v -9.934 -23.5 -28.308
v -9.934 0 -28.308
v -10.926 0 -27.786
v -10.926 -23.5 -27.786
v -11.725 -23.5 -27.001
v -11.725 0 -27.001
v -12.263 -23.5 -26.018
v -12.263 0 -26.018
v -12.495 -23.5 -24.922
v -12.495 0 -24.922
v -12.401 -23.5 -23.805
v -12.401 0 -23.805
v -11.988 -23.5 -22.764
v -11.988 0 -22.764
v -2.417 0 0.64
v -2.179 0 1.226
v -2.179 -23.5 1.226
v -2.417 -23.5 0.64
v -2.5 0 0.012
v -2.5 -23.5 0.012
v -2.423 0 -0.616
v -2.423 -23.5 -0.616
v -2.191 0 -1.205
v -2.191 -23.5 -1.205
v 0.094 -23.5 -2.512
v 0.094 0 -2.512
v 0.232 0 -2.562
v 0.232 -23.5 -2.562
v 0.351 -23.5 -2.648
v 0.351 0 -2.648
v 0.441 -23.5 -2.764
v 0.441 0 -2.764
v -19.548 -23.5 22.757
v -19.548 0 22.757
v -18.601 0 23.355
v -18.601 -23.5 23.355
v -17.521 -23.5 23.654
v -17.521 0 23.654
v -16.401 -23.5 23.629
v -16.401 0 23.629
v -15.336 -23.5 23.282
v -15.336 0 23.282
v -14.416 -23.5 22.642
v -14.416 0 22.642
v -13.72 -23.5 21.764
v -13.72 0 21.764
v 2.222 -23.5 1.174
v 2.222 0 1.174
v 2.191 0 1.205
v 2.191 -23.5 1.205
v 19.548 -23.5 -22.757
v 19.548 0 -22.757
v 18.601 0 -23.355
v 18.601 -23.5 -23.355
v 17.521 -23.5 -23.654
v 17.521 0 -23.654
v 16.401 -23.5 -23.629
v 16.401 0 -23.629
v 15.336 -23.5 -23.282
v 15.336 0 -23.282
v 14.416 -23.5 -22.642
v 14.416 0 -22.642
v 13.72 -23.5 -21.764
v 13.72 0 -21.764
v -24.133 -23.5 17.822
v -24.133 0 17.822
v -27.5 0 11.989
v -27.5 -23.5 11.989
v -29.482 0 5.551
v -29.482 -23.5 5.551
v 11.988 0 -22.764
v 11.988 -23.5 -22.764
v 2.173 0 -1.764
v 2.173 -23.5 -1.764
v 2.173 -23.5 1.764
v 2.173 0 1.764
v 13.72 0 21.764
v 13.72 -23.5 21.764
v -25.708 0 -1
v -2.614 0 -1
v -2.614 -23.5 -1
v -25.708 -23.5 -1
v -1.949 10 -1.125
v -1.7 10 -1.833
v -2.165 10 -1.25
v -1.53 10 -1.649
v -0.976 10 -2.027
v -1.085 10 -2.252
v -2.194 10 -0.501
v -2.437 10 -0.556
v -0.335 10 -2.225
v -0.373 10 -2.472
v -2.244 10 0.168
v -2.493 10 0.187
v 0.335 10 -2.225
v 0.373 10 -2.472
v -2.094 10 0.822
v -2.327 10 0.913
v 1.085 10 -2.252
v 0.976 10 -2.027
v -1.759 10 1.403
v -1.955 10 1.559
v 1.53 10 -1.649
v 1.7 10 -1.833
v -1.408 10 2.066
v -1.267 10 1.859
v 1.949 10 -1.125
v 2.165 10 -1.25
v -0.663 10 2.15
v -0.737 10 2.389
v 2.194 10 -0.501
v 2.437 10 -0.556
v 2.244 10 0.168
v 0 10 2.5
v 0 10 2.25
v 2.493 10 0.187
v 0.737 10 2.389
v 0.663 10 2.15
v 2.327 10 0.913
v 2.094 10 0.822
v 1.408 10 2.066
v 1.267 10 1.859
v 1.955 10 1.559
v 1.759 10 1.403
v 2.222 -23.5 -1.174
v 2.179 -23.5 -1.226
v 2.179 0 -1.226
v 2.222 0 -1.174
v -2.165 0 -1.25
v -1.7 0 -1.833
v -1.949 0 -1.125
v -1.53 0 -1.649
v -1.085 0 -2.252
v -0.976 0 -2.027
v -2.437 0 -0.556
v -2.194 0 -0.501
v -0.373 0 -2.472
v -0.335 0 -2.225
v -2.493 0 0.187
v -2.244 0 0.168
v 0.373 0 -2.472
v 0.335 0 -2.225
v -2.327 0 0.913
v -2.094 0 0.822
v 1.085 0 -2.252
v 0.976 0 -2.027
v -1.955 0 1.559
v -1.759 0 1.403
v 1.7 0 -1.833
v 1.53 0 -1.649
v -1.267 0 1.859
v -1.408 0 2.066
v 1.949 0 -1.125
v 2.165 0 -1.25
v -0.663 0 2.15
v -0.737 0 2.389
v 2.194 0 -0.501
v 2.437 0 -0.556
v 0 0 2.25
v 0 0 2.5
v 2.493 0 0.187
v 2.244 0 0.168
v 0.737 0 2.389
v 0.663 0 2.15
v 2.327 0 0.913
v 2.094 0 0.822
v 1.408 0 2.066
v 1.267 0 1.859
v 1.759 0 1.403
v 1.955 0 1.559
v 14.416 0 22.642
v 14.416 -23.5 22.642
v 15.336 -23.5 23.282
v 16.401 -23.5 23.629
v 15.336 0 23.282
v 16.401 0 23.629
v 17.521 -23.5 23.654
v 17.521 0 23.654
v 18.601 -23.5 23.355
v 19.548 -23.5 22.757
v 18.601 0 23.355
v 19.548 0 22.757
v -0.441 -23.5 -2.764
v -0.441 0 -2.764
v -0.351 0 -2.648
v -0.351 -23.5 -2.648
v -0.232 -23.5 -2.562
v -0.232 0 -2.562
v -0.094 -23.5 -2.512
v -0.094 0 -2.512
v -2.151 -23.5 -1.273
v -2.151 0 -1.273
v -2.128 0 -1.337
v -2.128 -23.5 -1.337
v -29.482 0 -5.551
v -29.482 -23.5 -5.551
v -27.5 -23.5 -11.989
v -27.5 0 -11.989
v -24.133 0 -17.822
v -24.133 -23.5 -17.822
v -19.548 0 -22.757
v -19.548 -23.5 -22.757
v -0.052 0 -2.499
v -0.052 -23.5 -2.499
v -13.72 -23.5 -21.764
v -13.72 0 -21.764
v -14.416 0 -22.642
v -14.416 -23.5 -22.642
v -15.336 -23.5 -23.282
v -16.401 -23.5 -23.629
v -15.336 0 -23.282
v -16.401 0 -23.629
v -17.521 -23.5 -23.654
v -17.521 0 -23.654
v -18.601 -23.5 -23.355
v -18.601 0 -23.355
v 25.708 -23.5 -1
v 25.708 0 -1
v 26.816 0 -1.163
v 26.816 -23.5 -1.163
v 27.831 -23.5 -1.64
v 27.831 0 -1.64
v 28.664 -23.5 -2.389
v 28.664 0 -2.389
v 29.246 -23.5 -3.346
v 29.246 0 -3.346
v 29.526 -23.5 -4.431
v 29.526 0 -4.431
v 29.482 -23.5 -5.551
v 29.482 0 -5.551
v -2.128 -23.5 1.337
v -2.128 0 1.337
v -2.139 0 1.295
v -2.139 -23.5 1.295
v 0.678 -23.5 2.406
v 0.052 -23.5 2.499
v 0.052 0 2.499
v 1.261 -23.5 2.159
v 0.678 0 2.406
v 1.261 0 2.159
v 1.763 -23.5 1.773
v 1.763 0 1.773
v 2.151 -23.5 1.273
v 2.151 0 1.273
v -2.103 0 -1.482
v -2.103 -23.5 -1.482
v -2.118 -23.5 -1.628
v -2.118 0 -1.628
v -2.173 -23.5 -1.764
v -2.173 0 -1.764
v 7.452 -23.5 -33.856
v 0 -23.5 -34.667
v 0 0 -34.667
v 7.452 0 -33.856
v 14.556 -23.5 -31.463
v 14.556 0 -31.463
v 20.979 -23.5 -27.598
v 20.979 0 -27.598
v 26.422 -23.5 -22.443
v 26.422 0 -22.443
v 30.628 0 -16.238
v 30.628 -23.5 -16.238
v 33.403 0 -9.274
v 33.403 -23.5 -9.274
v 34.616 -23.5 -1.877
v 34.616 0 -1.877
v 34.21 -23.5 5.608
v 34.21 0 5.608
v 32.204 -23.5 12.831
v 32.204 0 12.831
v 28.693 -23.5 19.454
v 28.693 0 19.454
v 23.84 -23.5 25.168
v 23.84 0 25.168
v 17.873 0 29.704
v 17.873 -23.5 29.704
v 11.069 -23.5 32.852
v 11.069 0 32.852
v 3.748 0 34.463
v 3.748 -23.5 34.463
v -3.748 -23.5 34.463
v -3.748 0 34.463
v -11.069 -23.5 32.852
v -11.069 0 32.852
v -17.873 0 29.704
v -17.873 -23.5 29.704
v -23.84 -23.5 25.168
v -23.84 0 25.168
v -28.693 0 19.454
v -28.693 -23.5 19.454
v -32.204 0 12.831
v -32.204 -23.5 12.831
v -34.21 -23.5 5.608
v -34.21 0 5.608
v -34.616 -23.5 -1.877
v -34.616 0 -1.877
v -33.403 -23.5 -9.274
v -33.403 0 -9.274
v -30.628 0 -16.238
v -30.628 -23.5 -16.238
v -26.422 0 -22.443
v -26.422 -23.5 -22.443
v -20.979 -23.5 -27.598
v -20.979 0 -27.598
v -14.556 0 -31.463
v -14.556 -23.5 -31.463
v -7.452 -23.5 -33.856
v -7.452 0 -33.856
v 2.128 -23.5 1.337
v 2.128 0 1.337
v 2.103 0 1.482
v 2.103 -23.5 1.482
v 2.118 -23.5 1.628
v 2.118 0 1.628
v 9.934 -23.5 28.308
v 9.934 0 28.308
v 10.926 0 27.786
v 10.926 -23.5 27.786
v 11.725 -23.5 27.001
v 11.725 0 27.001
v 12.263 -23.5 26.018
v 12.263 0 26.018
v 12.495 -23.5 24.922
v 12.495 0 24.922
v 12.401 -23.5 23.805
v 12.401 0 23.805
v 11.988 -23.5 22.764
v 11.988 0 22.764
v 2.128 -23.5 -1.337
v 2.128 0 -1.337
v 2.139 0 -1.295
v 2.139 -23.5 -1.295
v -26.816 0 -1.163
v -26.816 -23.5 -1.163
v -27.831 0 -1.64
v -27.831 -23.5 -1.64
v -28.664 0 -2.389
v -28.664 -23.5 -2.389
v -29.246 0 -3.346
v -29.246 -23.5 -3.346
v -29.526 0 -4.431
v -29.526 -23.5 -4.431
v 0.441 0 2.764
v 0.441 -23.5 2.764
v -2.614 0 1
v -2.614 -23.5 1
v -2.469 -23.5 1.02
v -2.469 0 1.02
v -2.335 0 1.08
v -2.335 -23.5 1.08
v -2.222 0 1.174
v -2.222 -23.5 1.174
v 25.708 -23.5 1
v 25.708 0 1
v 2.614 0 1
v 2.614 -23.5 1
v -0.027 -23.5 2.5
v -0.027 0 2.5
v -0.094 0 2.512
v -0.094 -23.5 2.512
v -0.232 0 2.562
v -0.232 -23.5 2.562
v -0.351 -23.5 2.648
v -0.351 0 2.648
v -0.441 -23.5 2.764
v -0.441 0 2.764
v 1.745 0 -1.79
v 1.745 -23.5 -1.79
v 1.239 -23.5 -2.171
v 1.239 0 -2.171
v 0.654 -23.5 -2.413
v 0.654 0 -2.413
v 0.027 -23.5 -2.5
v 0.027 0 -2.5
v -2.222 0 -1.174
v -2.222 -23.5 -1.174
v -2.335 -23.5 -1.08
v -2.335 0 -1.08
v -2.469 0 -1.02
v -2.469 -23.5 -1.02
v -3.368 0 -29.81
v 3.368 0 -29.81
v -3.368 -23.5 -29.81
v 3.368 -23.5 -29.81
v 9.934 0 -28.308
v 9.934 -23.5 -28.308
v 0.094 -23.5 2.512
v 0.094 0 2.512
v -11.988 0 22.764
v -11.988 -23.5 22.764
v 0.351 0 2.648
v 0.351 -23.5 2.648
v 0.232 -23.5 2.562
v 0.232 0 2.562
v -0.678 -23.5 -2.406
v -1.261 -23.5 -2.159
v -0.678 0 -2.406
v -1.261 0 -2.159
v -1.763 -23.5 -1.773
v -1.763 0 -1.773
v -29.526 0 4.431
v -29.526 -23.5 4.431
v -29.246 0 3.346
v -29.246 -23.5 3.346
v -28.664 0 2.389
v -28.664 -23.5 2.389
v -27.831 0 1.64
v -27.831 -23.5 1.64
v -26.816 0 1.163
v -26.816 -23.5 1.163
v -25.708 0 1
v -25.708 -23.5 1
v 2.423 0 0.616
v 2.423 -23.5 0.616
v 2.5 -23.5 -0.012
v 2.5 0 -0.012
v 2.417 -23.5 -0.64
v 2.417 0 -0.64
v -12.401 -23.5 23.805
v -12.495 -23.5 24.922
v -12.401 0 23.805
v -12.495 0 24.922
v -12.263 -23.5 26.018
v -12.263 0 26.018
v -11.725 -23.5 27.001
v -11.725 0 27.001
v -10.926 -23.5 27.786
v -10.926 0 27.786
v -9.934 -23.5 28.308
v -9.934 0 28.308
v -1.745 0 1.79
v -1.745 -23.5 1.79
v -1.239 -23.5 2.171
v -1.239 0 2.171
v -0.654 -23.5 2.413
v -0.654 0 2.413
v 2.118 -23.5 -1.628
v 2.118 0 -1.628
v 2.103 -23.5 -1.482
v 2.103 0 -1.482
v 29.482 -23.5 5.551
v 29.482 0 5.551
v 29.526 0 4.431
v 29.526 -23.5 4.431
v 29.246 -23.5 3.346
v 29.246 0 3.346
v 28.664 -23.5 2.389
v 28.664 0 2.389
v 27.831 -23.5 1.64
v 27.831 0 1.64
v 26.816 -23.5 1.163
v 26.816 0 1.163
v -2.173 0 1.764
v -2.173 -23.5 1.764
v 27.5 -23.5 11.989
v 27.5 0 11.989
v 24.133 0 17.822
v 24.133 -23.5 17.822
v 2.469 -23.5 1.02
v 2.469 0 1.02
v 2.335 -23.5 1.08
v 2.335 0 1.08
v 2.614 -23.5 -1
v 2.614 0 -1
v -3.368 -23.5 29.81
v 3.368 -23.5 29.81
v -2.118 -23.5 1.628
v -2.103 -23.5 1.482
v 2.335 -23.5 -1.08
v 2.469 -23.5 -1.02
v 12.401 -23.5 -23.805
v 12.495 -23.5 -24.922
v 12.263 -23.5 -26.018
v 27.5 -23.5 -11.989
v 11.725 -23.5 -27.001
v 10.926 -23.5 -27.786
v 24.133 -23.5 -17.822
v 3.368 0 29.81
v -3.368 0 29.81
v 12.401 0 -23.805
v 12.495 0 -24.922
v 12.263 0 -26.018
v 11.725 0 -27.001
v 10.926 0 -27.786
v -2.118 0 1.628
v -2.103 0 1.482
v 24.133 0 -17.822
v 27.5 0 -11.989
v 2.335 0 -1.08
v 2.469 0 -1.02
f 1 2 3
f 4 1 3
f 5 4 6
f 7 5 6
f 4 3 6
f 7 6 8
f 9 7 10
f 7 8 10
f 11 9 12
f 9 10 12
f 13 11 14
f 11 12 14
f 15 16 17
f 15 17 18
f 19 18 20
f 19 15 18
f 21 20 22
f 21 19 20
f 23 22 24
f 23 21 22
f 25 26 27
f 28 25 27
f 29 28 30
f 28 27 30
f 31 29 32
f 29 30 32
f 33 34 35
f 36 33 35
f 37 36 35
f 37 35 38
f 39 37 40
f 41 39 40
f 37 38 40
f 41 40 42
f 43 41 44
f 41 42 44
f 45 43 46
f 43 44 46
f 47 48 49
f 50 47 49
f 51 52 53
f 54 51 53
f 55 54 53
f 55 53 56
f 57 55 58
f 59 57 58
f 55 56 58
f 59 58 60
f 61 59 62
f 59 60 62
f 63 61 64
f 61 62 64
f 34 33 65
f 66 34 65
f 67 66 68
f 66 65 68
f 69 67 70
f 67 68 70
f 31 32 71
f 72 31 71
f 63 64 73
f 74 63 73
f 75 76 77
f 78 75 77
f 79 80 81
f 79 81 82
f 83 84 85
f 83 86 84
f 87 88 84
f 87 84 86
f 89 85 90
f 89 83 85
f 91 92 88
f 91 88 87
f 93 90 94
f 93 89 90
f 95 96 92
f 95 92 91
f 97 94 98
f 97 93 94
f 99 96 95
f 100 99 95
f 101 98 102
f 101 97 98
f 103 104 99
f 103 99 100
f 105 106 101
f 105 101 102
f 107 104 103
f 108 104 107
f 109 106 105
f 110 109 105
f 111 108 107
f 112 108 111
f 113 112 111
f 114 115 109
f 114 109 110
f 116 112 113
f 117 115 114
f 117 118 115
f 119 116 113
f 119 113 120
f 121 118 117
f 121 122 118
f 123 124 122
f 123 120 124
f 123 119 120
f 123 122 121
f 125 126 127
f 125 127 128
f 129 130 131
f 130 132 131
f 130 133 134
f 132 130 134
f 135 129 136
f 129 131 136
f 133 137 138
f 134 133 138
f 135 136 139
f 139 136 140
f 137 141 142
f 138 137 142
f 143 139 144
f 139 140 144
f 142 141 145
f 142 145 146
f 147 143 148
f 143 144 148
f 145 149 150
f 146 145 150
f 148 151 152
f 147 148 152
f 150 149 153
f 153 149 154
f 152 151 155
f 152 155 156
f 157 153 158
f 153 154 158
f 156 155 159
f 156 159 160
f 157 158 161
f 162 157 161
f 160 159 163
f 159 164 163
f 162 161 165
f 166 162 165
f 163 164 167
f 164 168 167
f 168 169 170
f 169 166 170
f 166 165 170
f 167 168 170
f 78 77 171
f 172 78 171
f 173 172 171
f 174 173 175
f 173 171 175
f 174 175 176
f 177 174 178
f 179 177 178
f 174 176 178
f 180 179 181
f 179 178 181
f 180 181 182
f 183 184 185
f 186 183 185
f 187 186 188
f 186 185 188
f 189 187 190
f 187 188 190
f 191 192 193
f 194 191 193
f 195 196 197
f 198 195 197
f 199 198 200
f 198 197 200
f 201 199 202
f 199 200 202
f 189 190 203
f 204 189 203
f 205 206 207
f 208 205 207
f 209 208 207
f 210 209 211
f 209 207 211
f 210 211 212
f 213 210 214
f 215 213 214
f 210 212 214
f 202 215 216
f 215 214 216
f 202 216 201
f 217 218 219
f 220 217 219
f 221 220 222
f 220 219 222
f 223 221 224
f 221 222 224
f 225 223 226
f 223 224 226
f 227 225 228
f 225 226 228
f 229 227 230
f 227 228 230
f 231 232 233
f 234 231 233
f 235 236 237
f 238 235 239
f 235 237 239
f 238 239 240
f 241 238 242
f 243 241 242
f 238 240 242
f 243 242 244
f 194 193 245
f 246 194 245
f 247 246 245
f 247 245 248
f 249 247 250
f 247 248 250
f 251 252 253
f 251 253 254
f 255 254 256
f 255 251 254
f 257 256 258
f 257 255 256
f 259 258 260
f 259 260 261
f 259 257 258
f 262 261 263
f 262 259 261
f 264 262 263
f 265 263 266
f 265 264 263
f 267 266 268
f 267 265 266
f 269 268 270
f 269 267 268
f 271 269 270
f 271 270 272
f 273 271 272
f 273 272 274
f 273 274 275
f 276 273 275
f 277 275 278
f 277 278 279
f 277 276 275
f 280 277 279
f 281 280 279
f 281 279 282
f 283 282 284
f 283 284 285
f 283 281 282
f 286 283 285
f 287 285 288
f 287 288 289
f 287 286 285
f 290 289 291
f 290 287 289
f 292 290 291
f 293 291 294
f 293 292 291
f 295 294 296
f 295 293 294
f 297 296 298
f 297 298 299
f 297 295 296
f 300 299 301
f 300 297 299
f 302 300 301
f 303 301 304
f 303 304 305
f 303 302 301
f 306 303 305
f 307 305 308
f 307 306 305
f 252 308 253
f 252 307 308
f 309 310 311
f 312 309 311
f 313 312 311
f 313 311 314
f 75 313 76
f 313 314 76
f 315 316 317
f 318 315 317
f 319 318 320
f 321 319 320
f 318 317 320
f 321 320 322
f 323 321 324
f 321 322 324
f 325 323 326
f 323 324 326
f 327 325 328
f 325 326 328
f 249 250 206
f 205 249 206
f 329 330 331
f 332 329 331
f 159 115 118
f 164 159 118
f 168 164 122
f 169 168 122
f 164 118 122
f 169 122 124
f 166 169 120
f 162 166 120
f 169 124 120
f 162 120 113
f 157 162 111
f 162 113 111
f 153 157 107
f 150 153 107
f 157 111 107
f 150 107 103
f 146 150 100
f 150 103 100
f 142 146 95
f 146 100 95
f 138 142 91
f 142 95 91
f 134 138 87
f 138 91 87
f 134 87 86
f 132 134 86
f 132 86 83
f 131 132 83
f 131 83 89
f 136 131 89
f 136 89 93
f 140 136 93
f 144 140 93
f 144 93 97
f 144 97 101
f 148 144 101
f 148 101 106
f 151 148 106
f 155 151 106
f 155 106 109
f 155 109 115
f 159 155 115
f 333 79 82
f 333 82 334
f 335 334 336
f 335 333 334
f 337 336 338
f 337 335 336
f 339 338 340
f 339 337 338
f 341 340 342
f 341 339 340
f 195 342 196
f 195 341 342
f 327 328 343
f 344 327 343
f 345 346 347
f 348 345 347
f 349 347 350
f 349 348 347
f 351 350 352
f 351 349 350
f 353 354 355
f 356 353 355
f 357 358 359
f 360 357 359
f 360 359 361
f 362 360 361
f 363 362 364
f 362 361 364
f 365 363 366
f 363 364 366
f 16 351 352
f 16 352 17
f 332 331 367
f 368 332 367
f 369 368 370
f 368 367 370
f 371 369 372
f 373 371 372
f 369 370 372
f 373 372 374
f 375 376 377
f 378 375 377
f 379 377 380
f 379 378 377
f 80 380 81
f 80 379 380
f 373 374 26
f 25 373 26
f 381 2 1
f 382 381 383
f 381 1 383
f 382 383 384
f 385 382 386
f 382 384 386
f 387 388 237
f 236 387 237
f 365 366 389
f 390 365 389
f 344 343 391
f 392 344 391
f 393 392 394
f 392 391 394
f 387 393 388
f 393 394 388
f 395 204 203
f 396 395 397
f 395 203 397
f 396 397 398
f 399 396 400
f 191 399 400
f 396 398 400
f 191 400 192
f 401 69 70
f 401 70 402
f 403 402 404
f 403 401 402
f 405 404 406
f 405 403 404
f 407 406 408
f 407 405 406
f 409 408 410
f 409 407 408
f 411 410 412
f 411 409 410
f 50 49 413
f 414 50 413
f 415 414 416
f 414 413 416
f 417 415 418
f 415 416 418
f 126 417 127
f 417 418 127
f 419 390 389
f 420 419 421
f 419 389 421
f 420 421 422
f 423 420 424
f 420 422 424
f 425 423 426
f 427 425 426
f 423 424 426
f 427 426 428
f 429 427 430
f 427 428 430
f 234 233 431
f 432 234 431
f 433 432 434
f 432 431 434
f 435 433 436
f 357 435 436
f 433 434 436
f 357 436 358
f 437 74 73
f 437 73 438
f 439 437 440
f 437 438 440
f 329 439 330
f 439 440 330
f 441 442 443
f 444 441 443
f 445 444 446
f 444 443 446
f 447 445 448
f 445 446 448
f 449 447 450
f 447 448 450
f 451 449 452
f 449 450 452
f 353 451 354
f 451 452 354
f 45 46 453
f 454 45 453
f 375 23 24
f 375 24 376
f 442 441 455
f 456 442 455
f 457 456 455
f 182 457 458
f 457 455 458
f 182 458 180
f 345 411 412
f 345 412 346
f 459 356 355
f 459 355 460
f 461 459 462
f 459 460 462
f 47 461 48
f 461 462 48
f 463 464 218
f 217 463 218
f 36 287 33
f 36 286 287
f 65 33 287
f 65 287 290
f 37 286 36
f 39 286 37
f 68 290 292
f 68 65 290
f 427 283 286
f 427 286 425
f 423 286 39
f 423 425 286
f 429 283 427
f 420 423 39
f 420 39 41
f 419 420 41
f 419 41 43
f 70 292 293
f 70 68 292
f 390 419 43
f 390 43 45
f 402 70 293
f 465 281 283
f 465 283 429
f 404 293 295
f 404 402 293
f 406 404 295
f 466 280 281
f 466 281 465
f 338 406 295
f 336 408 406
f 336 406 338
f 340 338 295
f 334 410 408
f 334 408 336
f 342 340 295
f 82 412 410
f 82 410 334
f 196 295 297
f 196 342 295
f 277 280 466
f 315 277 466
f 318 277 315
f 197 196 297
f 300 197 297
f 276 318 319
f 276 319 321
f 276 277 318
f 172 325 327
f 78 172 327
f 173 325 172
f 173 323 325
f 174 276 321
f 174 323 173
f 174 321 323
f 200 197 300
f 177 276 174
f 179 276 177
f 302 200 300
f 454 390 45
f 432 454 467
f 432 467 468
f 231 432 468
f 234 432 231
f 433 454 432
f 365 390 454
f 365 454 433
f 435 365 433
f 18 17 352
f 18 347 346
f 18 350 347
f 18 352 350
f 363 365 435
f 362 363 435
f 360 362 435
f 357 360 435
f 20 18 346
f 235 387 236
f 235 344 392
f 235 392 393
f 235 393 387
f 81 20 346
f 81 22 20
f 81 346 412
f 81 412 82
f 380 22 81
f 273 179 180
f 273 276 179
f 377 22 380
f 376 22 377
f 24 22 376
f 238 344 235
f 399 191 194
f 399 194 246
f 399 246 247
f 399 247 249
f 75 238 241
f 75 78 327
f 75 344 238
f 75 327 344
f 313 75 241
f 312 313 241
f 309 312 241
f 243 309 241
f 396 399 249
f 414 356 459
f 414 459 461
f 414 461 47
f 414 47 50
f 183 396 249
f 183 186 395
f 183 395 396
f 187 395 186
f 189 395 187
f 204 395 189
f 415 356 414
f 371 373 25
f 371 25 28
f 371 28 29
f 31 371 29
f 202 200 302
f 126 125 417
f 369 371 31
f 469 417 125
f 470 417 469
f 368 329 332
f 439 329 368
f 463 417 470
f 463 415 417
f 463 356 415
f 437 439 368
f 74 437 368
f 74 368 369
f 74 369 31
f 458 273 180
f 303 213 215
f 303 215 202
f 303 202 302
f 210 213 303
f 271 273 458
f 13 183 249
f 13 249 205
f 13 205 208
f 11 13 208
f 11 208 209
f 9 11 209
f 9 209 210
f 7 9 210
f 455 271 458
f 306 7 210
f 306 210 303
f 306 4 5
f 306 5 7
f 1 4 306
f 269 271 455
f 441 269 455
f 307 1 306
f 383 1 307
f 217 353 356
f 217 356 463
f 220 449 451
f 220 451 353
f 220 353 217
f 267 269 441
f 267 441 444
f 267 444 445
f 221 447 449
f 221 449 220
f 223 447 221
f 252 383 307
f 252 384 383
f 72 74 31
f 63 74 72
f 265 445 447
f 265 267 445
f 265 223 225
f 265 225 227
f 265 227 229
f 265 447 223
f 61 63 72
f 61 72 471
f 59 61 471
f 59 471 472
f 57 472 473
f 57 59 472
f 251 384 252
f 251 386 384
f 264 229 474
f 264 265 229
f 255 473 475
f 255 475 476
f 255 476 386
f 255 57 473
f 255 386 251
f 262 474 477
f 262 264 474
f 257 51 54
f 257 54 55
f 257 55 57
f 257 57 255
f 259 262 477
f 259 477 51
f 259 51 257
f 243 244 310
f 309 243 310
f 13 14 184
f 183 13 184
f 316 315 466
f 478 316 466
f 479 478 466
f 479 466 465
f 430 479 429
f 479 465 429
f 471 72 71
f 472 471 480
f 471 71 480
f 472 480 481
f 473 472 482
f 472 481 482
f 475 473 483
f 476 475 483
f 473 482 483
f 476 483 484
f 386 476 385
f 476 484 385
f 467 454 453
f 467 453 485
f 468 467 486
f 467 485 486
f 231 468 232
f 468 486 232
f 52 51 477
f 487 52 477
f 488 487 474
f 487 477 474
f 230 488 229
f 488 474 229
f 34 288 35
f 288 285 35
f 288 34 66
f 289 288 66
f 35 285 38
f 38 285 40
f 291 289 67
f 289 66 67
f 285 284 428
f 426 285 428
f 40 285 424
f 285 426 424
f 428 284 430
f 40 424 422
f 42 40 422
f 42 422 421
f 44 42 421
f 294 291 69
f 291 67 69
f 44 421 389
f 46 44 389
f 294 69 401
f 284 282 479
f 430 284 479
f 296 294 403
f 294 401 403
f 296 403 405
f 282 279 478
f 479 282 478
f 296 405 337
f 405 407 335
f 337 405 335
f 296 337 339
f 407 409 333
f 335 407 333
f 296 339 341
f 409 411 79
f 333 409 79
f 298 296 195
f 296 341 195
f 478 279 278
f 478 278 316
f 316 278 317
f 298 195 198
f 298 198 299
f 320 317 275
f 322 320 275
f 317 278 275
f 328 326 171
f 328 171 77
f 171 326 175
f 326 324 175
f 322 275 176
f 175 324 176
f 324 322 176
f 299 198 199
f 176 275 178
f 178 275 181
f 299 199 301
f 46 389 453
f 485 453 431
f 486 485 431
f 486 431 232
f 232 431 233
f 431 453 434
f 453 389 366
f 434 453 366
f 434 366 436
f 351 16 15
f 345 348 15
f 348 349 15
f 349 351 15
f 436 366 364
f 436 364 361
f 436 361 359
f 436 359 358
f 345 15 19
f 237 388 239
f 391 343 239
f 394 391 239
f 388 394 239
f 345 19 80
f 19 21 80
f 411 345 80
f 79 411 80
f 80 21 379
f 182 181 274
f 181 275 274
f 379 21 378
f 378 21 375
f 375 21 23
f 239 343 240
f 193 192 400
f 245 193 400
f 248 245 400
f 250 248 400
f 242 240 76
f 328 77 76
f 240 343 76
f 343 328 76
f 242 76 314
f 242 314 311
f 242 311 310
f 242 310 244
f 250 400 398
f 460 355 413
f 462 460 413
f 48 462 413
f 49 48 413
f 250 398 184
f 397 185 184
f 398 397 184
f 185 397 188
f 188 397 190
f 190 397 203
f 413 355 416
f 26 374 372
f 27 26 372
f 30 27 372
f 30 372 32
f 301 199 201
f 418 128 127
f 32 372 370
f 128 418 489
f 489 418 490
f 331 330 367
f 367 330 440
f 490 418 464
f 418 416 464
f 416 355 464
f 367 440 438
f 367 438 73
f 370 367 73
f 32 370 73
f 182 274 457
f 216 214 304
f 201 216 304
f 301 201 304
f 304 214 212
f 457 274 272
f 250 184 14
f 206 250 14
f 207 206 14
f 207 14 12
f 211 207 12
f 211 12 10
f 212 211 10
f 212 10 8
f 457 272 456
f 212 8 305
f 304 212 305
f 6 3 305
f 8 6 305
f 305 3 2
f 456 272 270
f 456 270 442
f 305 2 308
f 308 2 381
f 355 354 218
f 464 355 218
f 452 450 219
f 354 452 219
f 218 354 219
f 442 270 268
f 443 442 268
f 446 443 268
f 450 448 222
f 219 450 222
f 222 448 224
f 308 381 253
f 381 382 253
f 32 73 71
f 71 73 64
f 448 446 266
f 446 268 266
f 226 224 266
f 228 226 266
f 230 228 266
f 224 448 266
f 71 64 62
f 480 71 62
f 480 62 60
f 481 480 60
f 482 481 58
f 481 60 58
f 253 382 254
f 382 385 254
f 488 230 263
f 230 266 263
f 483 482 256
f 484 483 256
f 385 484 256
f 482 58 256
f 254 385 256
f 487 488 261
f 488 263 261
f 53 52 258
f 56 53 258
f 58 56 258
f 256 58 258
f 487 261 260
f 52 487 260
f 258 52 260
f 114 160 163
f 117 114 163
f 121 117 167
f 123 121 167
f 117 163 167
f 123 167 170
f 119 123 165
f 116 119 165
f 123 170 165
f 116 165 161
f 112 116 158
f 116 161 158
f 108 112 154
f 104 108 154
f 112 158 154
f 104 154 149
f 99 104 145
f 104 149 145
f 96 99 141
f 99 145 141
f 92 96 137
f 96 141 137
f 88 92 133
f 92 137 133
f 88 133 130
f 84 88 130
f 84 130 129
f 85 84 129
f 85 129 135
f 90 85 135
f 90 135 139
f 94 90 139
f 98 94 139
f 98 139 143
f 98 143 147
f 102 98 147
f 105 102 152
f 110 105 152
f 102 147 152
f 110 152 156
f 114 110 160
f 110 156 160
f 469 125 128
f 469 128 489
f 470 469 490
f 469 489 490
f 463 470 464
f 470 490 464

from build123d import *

# Parameters (mm, degrees)
SKETCH1_R             = 2.5
SKETCH1_R_2           = 1.5
BOSS_EXTRUDE1_DEPTH   = 10
BOSS_EXTRUDE3_DEPTH   = 23.5
BOSS_EXTRUDE3_2_DEPTH = 23.5
BOSS_EXTRUDE3_3_DEPTH = 23.5
BOSS_EXTRUDE3_4_DEPTH = 23.5
BOSS_EXTRUDE3_5_DEPTH = 23.5
BOSS_EXTRUDE3_6_DEPTH = 23.5
SKETCH5_R             = 34.666608733
SKETCH5_R_2           = 30
BOSS_EXTRUDE4_DEPTH   = 23.5
BOSS_EXTRUDE5_START   = -28
SKETCH6_R             = 1.5
BOSS_EXTRUDE5_DEPTH   = 28
SKETCH7_R             = 2.25
CUT_EXTRUDE1_DEPTH    = 28


with BuildPart() as part:
    # Sketch1 → Boss-Extrude1 (new body)
    with BuildSketch(Plane(origin=(0, 0, 0), x_dir=(1, 0, 0), z_dir=(0, 1, 0))):
        with Locations(Location((0, 0, 0), (0, 0, 270))):
            Circle(SKETCH1_R)
        with Locations(Location((0, 0, 0), (0, 0, 270))):
            Circle(SKETCH1_R_2, mode=Mode.SUBTRACT)
    extrude(amount=BOSS_EXTRUDE1_DEPTH)

    # Sketch6 → Boss-Extrude5 (add)
    with BuildSketch(Plane(origin=(0, 10, 0), x_dir=(1, 0, 0), z_dir=(0, 1, 0)).offset(BOSS_EXTRUDE5_START)):
        with Locations(Location((0, 0, 0), (0, 0, 270))):
            Circle(SKETCH6_R)
    extrude(amount=BOSS_EXTRUDE5_DEPTH)

    # Sketch7 → Cut-Extrude1 (cut)
    with BuildSketch(Plane(origin=(0, 10, 0), x_dir=(1, 0, 0), z_dir=(0, 1, 0))):
        with Locations(Location((0, 0, 0), (0, 0, 270))):
            Circle(SKETCH7_R)
    extrude(amount=-CUT_EXTRUDE1_DEPTH, mode=Mode.SUBTRACT)


with BuildPart() as body_2:
    # Sketch2 → Boss-Extrude3 (new body)
    with BuildSketch(Plane(origin=(0, 0, 0), x_dir=(-1, 0, 0), z_dir=(0, -1, 0))):
        with BuildLine():
            Line((2.61395079, 1), (25.707973339, 1))
            ThreePointArc((25.707973339, 1), (28.664062792, 2.388870469), (29.481986287, 5.550899437))
            ThreePointArc((29.481986287, 5.550899437), (30, 0), (29.481986287, -5.550899437))
            ThreePointArc((29.481986287, -5.550899437), (28.664062792, -2.388870469), (25.707973339, -1))
            Line((25.707973339, -1), (2.61395079, -1))
            ThreePointArc((2.61395079, -1), (2.399550586, -1.045528996), (2.222154945, -1.174257873))
            Line((2.222154945, -1.174257873), (2.178514499, -1.226407182))
            ThreePointArc((2.178514499, -1.226407182), (2.499969191, -0.012411485), (2.190584188, 1.204716114))
            Line((2.190584188, 1.204716114), (2.222154945, 1.174257873))
            ThreePointArc((2.222154945, 1.174257873), (2.399550586, 1.045528996), (2.61395079, 1))
        make_face()
    extrude(amount=BOSS_EXTRUDE3_DEPTH)



with BuildPart() as body_3:
    # Sketch2 → Boss-Extrude3 2 (new body)
    with BuildSketch(Plane(origin=(0, 0, 0), x_dir=(-1, 0, 0), z_dir=(0, -1, 0))):
        with BuildLine():
            Line((0.440949991, -2.763747789), (11.987961266, -22.763757991))
            ThreePointArc((11.987961266, -22.763757991), (12.263208883, -26.018241788), (9.933773217, -28.307598797))
            ThreePointArc((9.933773217, -28.307598797), (15, -25.980762114), (19.54821307, -22.75669936))
            ThreePointArc((19.54821307, -22.75669936), (16.400853909, -23.629371319), (13.720012073, -21.763757991))
            Line((13.720012073, -21.763757991), (2.173000799, -1.763747789))
            ThreePointArc((2.173000799, -1.763747789), (2.105229964, -1.555307267), (2.128014621, -1.337313697))
            Line((2.128014621, -1.337313697), (2.138606853, -1.294743499))
            ThreePointArc((2.138606853, -1.294743499), (1.239235934, -2.17124257), (0.027157474, -2.49985249))
            Line((0.027157474, -2.49985249), (0.094140324, -2.511571571))
            ThreePointArc((0.094140324, -2.511571571), (0.294320622, -2.600836263), (0.440949991, -2.763747789))
        make_face()
    extrude(amount=BOSS_EXTRUDE3_2_DEPTH)


with BuildPart() as body_4:
    # Sketch2 → Boss-Extrude3 3 (new body)
    with BuildSketch(Plane(origin=(0, 0, 0), x_dir=(-1, 0, 0), z_dir=(0, -1, 0))):
        with BuildLine():
            Line((-2.173000799, -1.763747789), (-13.720012073, -21.763757991))
            ThreePointArc((-13.720012073, -21.763757991), (-16.400853909, -23.629371319), (-19.54821307, -22.75669936))
            ThreePointArc((-19.54821307, -22.75669936), (-15, -25.980762114), (-9.933773217, -28.307598797))
            ThreePointArc((-9.933773217, -28.307598797), (-12.263208883, -26.018241788), (-11.987961266, -22.763757991))
            Line((-11.987961266, -22.763757991), (-0.440949991, -2.763747789))
            ThreePointArc((-0.440949991, -2.763747789), (-0.294320622, -2.600836263), (-0.094140324, -2.511571571))
            Line((-0.094140324, -2.511571571), (-0.051977335, -2.499459613))
            ThreePointArc((-0.051977335, -2.499459613), (-1.260733257, -2.158831086), (-2.151357025, -1.273445308))
            Line((-2.151357025, -1.273445308), (-2.128014621, -1.337313697))
            ThreePointArc((-2.128014621, -1.337313697), (-2.105229964, -1.555307267), (-2.173000799, -1.763747789))
        make_face()
    extrude(amount=BOSS_EXTRUDE3_3_DEPTH)


with BuildPart() as body_5:
    # Sketch2 → Boss-Extrude3 4 (new body)
    with BuildSketch(Plane(origin=(0, 0, 0), x_dir=(-1, 0, 0), z_dir=(0, -1, 0))):
        with BuildLine():
            Line((-2.61395079, 1), (-25.707973339, 1))
            ThreePointArc((-25.707973339, 1), (-28.664062792, 2.388870469), (-29.481986287, 5.550899437))
            ThreePointArc((-29.481986287, 5.550899437), (-30, 0), (-29.481986287, -5.550899437))
            ThreePointArc((-29.481986287, -5.550899437), (-28.664062792, -2.388870469), (-25.707973339, -1))
            Line((-25.707973339, -1), (-2.61395079, -1))
            ThreePointArc((-2.61395079, -1), (-2.399550586, -1.045528996), (-2.222154945, -1.174257873))
            Line((-2.222154945, -1.174257873), (-2.190584188, -1.204716114))
            ThreePointArc((-2.190584188, -1.204716114), (-2.499969191, 0.012411485), (-2.178514499, 1.226407182))
            Line((-2.178514499, 1.226407182), (-2.222154945, 1.174257873))
            ThreePointArc((-2.222154945, 1.174257873), (-2.399550586, 1.045528996), (-2.61395079, 1))
        make_face()
    extrude(amount=BOSS_EXTRUDE3_4_DEPTH)


with BuildPart() as body_6:
    # Sketch2 → Boss-Extrude3 5 (new body)
    with BuildSketch(Plane(origin=(0, 0, 0), x_dir=(-1, 0, 0), z_dir=(0, -1, 0))):
        with BuildLine():
            Line((-0.440949991, 2.763747789), (-11.987961266, 22.763757991))
            ThreePointArc((-11.987961266, 22.763757991), (-12.263208883, 26.018241788), (-9.933773217, 28.307598797))
            ThreePointArc((-9.933773217, 28.307598797), (-15, 25.980762114), (-19.54821307, 22.75669936))
            ThreePointArc((-19.54821307, 22.75669936), (-16.400853909, 23.629371319), (-13.720012073, 21.763757991))
            Line((-13.720012073, 21.763757991), (-2.173000799, 1.763747789))
            ThreePointArc((-2.173000799, 1.763747789), (-2.105229964, 1.555307267), (-2.128014621, 1.337313697))
            Line((-2.128014621, 1.337313697), (-2.138606853, 1.294743499))
            ThreePointArc((-2.138606853, 1.294743499), (-1.239235934, 2.17124257), (-0.027157474, 2.49985249))
            Line((-0.027157474, 2.49985249), (-0.094140324, 2.511571571))
            ThreePointArc((-0.094140324, 2.511571571), (-0.294320622, 2.600836263), (-0.440949991, 2.763747789))
        make_face()
    extrude(amount=BOSS_EXTRUDE3_5_DEPTH)


with BuildPart() as body_7:
    # Sketch2 → Boss-Extrude3 6 (new body)
    with BuildSketch(Plane(origin=(0, 0, 0), x_dir=(-1, 0, 0), z_dir=(0, -1, 0))):
        with BuildLine():
            Line((2.173000799, 1.763747789), (13.720012073, 21.763757991))
            ThreePointArc((13.720012073, 21.763757991), (16.400853909, 23.629371319), (19.54821307, 22.75669936))
            ThreePointArc((19.54821307, 22.75669936), (15, 25.980762114), (9.933773217, 28.307598797))
            ThreePointArc((9.933773217, 28.307598797), (12.263208883, 26.018241788), (11.987961266, 22.763757991))
            Line((11.987961266, 22.763757991), (0.440949991, 2.763747789))
            ThreePointArc((0.440949991, 2.763747789), (0.294320622, 2.600836263), (0.094140324, 2.511571571))
            Line((0.094140324, 2.511571571), (0.051977335, 2.499459613))
            ThreePointArc((0.051977335, 2.499459613), (1.260733257, 2.158831086), (2.151357025, 1.273445308))
            Line((2.151357025, 1.273445308), (2.128014621, 1.337313697))
            ThreePointArc((2.128014621, 1.337313697), (2.105229964, 1.555307267), (2.173000799, 1.763747789))
        make_face()
    extrude(amount=BOSS_EXTRUDE3_6_DEPTH)


with BuildPart() as body_2_1:
    add(body_2.part)

    add(body_3.part)  # Boss-Extrude4 merges body 3

    add(body_4.part)  # Boss-Extrude4 merges body 4

    add(body_5.part)  # Boss-Extrude4 merges body 5

    add(body_6.part)  # Boss-Extrude4 merges body 6

    add(body_7.part)  # Boss-Extrude4 merges body 7
    # Sketch5 → Boss-Extrude4 (add)
    with BuildSketch(Plane(origin=(0, -23.5, 0), x_dir=(-1, 0, 0), z_dir=(0, -1, 0))):
        with Locations(Location((0, 0, 0), (0, 0, 90))):
            Circle(SKETCH5_R)
        Circle(SKETCH5_R_2, mode=Mode.SUBTRACT)
    extrude(amount=-BOSS_EXTRUDE4_DEPTH)


solid = Compound([part.part, body_2_1.part])
